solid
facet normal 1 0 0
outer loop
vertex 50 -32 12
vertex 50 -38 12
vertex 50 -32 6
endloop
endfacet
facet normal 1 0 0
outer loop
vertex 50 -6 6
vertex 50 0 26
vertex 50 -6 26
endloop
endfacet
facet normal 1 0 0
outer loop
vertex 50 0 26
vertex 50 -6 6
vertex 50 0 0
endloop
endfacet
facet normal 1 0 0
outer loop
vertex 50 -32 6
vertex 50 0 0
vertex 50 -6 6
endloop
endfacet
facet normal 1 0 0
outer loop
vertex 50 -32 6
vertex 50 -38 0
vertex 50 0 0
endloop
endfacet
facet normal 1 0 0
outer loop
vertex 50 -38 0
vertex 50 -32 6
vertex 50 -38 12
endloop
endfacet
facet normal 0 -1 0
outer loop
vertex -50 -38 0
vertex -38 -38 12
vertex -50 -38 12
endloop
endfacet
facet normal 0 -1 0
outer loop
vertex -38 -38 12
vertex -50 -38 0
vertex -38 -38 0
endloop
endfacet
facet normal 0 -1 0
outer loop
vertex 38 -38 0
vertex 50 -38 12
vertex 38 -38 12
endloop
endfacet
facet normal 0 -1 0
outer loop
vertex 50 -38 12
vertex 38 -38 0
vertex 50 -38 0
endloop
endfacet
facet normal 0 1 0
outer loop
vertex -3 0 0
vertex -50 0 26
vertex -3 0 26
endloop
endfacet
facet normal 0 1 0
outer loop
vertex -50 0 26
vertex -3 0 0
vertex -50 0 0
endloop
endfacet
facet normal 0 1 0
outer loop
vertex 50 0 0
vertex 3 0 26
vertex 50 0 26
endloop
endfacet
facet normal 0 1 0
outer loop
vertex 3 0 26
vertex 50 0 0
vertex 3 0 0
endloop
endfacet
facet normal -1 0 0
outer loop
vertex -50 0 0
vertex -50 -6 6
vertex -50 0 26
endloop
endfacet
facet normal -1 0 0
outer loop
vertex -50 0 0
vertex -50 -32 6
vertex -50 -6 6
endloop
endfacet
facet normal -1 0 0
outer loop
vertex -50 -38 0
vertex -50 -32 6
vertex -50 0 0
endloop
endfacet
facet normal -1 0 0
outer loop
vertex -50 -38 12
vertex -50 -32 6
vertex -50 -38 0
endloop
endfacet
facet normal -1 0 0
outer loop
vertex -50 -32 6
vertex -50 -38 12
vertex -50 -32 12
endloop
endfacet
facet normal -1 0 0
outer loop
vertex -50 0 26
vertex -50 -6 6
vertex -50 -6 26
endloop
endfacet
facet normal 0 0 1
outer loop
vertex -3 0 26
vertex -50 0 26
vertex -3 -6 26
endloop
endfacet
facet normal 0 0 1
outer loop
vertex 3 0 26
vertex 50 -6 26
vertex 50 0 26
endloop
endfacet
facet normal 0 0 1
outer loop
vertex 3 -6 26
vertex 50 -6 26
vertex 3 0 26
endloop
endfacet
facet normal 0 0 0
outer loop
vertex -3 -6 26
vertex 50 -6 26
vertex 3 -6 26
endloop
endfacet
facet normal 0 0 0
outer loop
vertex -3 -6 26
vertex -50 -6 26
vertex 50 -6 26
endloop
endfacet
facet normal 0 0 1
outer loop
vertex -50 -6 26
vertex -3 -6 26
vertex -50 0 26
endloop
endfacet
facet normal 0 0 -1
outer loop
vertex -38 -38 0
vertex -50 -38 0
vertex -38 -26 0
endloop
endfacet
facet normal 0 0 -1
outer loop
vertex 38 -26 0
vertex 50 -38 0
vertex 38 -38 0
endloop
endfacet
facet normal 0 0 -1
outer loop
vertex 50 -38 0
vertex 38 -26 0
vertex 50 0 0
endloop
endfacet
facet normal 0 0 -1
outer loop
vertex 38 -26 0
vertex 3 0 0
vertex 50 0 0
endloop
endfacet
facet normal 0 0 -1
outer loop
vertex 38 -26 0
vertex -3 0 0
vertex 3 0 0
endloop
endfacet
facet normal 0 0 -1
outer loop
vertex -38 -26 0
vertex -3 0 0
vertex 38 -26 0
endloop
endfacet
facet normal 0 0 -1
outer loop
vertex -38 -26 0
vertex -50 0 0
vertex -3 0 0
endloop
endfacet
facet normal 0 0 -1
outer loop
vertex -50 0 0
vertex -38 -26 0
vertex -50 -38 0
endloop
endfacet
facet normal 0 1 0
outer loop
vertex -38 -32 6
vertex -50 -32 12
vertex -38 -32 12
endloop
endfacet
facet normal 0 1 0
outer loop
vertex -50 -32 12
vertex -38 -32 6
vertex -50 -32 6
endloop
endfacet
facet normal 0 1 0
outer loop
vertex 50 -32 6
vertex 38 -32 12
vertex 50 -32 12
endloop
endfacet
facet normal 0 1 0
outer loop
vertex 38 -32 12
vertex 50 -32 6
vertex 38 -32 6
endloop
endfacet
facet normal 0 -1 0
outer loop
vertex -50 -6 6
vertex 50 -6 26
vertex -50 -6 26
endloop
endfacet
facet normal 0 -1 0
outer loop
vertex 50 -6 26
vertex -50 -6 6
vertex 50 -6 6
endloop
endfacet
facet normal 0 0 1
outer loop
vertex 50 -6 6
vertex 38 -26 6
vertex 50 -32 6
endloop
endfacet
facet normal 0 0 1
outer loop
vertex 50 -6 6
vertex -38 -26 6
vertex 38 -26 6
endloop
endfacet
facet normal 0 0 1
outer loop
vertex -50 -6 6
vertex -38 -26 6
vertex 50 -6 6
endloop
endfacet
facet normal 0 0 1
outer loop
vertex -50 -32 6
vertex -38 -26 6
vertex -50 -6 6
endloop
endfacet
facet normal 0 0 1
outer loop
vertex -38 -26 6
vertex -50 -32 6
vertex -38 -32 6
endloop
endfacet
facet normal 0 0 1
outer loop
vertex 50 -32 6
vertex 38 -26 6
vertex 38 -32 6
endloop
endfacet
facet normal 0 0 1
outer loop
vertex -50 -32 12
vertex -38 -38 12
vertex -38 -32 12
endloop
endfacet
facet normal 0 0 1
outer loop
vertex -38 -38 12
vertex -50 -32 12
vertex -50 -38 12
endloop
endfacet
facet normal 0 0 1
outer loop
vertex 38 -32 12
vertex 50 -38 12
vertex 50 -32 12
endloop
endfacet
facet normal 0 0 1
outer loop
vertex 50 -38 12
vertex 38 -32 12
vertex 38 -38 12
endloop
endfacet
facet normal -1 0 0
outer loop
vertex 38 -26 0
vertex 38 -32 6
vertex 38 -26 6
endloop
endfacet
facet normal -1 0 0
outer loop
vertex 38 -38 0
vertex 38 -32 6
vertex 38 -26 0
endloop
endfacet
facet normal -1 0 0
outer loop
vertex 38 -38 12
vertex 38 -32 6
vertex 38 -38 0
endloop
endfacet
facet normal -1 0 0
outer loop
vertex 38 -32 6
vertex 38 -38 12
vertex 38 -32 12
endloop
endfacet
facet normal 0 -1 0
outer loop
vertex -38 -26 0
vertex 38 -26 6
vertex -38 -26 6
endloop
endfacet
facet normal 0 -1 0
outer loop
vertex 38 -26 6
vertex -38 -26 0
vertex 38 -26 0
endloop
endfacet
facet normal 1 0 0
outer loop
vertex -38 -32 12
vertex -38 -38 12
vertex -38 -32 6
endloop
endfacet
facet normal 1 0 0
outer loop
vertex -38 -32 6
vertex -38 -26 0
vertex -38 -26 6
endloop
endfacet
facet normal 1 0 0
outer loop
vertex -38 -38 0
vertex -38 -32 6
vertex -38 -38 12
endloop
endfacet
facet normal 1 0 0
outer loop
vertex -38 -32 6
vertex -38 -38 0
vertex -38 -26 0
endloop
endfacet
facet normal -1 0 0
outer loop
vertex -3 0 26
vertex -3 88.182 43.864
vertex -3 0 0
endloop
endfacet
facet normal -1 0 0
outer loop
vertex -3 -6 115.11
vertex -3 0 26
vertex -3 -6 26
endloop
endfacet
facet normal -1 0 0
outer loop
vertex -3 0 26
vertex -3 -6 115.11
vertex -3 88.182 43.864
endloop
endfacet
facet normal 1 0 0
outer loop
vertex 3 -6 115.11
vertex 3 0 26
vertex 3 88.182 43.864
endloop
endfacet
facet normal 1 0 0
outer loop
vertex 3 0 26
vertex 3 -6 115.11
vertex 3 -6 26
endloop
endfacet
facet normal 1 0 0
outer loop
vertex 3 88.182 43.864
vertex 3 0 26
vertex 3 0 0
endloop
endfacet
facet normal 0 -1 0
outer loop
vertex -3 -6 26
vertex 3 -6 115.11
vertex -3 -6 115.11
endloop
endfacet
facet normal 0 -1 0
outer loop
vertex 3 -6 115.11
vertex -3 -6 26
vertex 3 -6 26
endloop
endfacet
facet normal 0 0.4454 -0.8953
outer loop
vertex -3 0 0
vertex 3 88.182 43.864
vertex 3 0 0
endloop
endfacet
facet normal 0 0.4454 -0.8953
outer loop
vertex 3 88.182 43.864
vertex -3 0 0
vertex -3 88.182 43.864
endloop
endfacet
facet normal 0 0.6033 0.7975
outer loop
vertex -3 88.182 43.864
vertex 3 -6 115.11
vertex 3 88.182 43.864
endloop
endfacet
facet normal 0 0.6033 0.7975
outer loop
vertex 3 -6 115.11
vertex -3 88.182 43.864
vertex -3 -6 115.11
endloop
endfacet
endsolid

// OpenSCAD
/* Easel for the Mandala frame. */

ANGLE = asin(15.4 / 17.2);

FRAME_LENGTH = 220;
FRAME_THICKNESS = 25 + 1;
BORDER = 6;

WIDTH = 100;

ATOM = 0.01;

echo(ANGLE);
echo(cos(ANGLE)*17.2);

module easel(straight=false, frameshade=false) {
    translate([-WIDTH/2, 0, 0])
    rotate([straight ? 90-ANGLE : 0, 0, 0]) {
        rotate([ANGLE, 0, 0]) {
            difference() {
                cube([WIDTH, FRAME_THICKNESS, FRAME_THICKNESS+BORDER*2]);
                
                if (frameshade)
                    %
                    translate([-(FRAME_LENGTH-WIDTH)/2, BORDER, BORDER])
                    cube([FRAME_LENGTH, FRAME_LENGTH, FRAME_THICKNESS]);

                translate([-ATOM, BORDER, BORDER])
                cube([WIDTH+ATOM*2, FRAME_THICKNESS, FRAME_THICKNESS]);

                translate([-ATOM, BORDER+BORDER, BORDER+BORDER*2])
                cube([WIDTH+ATOM*2, FRAME_LENGTH, FRAME_THICKNESS]);

                translate([BORDER*2, -BORDER, BORDER + FRAME_THICKNESS - BORDER])
                cube([WIDTH-BORDER*4, FRAME_THICKNESS, FRAME_THICKNESS]);
            }
            
        }

        intersection() {
            cl = cos(ANGLE)*FRAME_LENGTH;
            rotate([ANGLE, 0, 0])
            translate([WIDTH/2-BORDER/2, 0, BORDER-cl*2 ])
            cube([BORDER, FRAME_LENGTH, cl*2]);

            cube([WIDTH, FRAME_LENGTH*2, FRAME_LENGTH]);

            rotate([90-ANGLE, 0, 0])
            translate([0, 0, -FRAME_LENGTH])
            cube([WIDTH, FRAME_LENGTH*cos(ANGLE) * .9, FRAME_LENGTH*2]);   
        }
    }
}

if (! $preview)
    easel(true);
else
    easel(frameshade=true);
